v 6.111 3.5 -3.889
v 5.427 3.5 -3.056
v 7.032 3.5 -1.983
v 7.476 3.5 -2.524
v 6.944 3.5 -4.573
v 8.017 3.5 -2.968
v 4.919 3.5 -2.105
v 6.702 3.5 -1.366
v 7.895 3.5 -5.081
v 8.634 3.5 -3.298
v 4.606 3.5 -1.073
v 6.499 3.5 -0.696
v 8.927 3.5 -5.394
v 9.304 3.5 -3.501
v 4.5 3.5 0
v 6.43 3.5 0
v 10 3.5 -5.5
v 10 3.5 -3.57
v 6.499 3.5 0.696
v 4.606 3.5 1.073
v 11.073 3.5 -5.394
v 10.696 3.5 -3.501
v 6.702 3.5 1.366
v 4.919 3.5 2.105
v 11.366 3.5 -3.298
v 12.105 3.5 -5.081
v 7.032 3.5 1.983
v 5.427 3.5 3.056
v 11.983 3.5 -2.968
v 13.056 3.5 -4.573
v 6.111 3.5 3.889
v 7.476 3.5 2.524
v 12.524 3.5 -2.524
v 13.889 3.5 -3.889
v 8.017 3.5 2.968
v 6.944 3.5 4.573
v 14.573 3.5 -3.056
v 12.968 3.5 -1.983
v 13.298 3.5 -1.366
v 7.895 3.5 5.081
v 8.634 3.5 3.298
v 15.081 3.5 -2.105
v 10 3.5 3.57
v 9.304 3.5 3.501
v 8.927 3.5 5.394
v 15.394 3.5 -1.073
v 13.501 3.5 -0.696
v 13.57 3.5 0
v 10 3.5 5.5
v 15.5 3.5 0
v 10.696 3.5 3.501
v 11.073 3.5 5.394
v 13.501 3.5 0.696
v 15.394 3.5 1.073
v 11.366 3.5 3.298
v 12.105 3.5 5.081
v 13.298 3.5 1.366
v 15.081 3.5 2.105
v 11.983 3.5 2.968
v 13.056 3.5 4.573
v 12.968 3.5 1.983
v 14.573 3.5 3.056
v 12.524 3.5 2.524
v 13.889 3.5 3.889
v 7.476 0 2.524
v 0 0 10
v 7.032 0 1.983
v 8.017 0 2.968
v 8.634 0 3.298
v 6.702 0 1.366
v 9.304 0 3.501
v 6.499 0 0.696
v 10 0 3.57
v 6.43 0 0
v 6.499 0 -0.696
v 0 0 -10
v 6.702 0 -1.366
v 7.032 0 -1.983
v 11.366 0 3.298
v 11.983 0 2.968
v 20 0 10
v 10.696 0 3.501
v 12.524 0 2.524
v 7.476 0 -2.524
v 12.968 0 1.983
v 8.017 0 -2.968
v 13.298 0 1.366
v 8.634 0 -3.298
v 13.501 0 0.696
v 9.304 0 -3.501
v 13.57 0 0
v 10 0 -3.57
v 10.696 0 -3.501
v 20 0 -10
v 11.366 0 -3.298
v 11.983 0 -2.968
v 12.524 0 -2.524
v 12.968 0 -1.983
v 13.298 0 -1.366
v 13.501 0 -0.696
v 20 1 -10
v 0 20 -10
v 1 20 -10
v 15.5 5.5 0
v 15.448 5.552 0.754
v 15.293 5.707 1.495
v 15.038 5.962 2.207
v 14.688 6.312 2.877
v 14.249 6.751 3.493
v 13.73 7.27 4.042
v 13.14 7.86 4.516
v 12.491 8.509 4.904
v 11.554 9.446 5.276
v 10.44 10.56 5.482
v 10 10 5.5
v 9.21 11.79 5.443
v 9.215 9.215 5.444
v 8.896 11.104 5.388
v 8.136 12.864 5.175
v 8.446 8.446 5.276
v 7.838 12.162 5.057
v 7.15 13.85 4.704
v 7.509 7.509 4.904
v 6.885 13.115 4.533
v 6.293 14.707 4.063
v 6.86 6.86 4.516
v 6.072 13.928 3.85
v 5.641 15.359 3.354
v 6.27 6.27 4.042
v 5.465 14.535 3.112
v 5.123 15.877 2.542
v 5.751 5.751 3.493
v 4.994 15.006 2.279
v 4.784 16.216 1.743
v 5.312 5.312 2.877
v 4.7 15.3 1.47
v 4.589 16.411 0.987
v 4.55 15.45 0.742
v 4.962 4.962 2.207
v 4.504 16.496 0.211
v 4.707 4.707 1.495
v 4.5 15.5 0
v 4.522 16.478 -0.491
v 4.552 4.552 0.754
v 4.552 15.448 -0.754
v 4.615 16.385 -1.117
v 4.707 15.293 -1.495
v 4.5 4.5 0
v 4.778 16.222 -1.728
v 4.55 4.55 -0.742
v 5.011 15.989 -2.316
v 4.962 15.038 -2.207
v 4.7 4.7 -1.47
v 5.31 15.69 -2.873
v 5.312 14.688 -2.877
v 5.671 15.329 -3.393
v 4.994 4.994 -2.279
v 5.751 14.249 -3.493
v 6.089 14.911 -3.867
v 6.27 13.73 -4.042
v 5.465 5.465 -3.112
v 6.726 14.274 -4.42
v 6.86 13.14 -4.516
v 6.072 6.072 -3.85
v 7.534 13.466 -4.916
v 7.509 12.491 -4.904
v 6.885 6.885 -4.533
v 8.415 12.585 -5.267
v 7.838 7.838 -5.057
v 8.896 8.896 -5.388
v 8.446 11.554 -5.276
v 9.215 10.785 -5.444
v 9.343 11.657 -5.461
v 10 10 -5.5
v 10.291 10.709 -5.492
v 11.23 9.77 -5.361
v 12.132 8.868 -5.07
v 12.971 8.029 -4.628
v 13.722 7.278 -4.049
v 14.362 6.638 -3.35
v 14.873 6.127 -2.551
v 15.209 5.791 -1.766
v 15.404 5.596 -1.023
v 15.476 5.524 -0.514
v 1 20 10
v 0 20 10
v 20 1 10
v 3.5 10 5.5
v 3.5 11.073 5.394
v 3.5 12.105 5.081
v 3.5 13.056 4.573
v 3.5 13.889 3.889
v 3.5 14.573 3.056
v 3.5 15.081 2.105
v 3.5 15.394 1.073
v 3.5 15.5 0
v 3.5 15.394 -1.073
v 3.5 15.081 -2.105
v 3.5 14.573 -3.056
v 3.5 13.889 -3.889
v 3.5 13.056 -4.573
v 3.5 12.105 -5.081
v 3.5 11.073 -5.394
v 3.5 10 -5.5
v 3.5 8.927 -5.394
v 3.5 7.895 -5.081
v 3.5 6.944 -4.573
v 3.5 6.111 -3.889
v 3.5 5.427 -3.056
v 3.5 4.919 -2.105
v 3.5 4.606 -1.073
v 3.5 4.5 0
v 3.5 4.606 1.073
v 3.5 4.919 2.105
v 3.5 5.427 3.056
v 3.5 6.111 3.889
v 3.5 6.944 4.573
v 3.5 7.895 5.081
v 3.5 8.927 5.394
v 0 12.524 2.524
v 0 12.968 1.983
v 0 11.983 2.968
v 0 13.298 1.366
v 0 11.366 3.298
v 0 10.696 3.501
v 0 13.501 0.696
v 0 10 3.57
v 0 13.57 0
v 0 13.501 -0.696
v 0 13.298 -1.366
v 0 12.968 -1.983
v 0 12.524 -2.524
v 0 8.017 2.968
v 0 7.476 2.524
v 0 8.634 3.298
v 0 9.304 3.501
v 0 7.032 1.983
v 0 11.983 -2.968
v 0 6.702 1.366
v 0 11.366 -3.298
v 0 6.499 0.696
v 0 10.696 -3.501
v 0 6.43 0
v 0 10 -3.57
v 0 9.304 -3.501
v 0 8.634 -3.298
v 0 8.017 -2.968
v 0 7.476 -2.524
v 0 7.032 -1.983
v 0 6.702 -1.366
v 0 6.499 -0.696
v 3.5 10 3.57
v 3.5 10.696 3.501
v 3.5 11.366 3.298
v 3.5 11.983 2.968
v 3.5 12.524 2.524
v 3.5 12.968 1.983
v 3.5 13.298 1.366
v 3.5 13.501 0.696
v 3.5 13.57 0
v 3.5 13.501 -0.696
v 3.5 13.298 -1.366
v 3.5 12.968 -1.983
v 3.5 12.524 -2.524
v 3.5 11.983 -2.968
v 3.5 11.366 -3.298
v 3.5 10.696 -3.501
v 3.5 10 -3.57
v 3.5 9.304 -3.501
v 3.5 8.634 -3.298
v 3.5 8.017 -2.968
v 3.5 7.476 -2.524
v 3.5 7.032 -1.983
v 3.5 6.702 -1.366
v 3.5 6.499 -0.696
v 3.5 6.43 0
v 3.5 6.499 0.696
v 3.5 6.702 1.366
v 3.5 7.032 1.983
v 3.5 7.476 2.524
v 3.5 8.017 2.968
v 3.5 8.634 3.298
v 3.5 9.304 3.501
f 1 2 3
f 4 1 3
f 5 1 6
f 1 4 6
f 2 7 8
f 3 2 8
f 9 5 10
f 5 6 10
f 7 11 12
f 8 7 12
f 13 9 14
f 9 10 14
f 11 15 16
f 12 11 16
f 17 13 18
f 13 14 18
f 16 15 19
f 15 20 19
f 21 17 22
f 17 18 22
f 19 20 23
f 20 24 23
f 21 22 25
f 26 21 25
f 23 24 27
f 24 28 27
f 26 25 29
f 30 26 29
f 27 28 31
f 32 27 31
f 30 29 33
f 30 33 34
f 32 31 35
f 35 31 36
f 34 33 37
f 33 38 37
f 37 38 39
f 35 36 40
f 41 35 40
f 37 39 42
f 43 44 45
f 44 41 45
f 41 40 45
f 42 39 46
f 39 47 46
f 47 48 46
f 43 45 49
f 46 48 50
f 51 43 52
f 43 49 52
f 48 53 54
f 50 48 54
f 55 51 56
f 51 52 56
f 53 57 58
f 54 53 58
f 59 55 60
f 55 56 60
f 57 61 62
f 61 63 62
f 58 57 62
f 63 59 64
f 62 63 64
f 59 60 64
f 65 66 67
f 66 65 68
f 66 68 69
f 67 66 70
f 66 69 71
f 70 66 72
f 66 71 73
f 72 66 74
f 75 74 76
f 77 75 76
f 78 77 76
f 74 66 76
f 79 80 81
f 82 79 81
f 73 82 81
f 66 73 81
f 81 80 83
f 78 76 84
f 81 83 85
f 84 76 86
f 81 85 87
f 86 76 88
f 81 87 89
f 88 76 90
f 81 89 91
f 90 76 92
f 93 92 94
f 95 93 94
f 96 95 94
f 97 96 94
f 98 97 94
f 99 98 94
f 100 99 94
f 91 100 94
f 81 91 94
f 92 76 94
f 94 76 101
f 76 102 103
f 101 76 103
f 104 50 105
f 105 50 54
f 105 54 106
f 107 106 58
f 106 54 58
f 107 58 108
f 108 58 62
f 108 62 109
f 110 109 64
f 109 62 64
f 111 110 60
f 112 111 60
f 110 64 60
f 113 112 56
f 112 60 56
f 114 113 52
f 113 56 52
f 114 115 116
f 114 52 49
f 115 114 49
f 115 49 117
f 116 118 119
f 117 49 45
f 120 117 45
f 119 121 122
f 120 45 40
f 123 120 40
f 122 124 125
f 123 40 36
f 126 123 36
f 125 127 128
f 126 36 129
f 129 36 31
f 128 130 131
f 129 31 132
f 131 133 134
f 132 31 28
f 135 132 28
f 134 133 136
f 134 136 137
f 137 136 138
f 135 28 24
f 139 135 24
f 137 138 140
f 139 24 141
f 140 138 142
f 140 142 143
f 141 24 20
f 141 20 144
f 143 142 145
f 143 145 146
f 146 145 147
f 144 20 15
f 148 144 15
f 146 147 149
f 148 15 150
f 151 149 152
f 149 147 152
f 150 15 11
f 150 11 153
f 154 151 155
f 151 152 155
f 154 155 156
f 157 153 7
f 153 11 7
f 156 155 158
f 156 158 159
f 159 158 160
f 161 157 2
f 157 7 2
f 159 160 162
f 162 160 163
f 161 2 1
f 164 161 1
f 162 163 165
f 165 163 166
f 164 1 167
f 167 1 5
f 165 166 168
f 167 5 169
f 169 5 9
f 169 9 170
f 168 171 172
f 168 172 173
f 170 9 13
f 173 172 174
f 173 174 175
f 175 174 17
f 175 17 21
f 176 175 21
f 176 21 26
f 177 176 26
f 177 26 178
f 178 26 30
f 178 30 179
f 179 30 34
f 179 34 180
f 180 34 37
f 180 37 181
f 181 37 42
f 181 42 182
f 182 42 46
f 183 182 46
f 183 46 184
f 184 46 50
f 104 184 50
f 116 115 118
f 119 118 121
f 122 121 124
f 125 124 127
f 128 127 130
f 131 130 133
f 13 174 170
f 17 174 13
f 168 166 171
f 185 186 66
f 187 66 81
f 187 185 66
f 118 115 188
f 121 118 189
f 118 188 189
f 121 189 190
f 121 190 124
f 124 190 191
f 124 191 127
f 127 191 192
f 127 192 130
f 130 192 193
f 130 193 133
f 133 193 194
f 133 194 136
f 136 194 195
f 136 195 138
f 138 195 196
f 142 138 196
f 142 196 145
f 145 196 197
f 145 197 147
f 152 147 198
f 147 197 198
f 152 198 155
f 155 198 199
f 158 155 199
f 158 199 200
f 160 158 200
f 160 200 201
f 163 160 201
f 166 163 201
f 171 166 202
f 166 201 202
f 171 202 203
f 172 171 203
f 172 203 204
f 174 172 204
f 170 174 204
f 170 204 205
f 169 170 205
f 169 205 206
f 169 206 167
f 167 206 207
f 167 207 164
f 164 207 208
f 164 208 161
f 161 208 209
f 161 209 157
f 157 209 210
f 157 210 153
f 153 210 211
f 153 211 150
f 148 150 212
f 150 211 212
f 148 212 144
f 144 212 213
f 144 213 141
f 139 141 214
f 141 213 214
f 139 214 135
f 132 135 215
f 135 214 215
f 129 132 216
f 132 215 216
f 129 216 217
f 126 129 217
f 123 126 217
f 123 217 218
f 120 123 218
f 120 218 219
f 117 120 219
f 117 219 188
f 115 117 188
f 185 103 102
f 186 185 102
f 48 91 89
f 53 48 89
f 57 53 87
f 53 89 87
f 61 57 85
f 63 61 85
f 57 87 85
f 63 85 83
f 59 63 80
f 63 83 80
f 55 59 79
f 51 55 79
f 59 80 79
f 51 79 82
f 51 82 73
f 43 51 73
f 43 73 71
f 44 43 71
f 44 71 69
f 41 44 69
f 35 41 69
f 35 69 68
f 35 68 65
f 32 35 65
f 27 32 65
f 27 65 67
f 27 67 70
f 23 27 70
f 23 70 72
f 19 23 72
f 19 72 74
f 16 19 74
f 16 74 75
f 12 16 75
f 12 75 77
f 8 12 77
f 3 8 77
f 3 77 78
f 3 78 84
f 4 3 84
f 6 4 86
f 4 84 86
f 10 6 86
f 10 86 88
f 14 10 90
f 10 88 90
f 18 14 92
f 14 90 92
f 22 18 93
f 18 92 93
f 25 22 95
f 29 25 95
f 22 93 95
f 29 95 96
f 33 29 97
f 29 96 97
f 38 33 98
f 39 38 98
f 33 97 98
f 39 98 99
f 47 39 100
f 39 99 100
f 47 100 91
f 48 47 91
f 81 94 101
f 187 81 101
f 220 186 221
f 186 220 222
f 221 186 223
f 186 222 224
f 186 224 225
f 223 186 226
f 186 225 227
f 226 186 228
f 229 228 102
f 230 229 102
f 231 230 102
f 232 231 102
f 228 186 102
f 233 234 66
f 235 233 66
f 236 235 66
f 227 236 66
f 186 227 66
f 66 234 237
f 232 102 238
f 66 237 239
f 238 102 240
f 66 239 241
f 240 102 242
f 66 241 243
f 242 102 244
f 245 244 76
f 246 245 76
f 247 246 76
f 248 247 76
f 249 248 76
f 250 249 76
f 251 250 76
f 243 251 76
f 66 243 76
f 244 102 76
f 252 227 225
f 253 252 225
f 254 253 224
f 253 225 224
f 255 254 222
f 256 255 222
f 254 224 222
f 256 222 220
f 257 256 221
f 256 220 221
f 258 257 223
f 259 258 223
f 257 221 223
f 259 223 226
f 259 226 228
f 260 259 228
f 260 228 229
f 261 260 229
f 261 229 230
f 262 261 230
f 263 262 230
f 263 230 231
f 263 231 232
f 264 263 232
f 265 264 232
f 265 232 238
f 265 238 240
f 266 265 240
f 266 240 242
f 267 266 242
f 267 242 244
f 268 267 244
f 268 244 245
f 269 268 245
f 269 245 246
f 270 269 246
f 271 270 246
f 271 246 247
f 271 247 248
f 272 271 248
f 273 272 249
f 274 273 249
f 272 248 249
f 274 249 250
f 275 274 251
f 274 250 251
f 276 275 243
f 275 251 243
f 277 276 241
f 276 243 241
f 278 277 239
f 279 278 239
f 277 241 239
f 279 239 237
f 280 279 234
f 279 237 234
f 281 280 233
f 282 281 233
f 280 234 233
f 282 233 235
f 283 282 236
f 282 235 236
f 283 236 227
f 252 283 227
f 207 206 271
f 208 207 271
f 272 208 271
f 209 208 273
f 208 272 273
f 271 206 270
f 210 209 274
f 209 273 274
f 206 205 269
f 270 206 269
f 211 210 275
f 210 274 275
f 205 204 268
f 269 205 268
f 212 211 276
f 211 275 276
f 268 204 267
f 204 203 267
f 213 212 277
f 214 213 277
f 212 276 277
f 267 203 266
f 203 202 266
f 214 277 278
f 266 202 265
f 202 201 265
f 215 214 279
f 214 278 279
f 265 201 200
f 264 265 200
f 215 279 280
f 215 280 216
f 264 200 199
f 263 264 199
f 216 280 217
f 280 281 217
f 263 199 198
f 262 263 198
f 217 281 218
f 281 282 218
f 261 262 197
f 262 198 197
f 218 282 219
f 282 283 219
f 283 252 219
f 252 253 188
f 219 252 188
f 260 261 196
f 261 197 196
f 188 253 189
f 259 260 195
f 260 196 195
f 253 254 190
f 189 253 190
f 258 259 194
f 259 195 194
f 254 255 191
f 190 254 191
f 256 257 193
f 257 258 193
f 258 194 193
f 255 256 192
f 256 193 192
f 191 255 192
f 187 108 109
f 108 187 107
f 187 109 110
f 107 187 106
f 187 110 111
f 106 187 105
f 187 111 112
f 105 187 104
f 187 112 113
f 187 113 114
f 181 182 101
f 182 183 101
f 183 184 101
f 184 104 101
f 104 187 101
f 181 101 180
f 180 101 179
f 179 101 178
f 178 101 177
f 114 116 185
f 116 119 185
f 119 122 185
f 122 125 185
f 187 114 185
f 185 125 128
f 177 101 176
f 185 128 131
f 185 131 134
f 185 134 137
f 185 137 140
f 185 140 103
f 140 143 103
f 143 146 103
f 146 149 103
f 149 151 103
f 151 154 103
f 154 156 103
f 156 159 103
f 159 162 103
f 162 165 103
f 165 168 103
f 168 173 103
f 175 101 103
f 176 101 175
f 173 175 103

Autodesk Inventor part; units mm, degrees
ref_plane "YZ Plane" through (0, 0, 0) normal (1, 0, 0) x (0, 1, 0)
ref_plane "XZ Plane" through (0, 0, 0) normal (0, 1, 0) x (-1, 0, 0)
ref_plane "XY Plane" through (0, 0, 0) normal (0, 0, 1) x (1, 0, 0)
sketch "Sketch1" plane through (0, 0, 0) normal (0, 0, 1) x (1, 0, 0)
  line L0 (0, 0) -> (20, 0)
  line L1 (20, 0) -> (20, 1)
  line L2 (20, 1) -> (1, 20)
  line L3 (1, 20) -> (0, 20)
  line L4 (0, 20) -> (0, 0)
  dimension "d0" = 135
  dimension "d1" = 20
  dimension "d2" = 20
  dimension "d3" = 1
extrude "Extrusion1" add sketch "Sketch1" along normal mid plane 20
sketch "Sketch2" plane through (0, 0, 10) normal (0, -1, 0) x (1, 0, 0)
  circle A0 centre (10, -10) radius 3.57
  point P0 (0, -10)
  dimension "d6" = 7.14
extrude "Extrusion2" cut sketch "Sketch2" against normal blind 3.5
sketch "Sketch3" plane through (10, 3.5, 0) normal (0, -1, 0) x (1, 0, 0)
  circle A0 centre (0, 0) radius 3.57 projected
  circle A1 centre (0, 0) radius 5.5
  point P0 (-10, 0)
  dimension "d9" = 11
extrude "Extrusion3" cut sketch "Sketch3" against normal up to next contours A0 | A1
sketch "Sketch4" plane through (0, 0, 10) normal (-1, 0, 0) x (0, 0, 1)
  circle A0 centre (-10, 10) radius 3.57
  point P0 (-10, 0)
  dimension "d12" = 7.14
extrude "Extrusion4" cut sketch "Sketch4" against normal blind 3.5
sketch "Sketch5" plane through (3.5, 10, 0) normal (-1, 0, 0) x (0, 0, 1)
  circle A0 centre (0, 0) radius 3.57 projected
  circle A1 centre (0, 0) radius 5.5
  point P0 (0, -10)
  dimension "d15" = 11
extrude "Extrusion5" cut sketch "Sketch5" against normal up to next contours A0 | A1
properties part number "Black Angle Corner Connector"
